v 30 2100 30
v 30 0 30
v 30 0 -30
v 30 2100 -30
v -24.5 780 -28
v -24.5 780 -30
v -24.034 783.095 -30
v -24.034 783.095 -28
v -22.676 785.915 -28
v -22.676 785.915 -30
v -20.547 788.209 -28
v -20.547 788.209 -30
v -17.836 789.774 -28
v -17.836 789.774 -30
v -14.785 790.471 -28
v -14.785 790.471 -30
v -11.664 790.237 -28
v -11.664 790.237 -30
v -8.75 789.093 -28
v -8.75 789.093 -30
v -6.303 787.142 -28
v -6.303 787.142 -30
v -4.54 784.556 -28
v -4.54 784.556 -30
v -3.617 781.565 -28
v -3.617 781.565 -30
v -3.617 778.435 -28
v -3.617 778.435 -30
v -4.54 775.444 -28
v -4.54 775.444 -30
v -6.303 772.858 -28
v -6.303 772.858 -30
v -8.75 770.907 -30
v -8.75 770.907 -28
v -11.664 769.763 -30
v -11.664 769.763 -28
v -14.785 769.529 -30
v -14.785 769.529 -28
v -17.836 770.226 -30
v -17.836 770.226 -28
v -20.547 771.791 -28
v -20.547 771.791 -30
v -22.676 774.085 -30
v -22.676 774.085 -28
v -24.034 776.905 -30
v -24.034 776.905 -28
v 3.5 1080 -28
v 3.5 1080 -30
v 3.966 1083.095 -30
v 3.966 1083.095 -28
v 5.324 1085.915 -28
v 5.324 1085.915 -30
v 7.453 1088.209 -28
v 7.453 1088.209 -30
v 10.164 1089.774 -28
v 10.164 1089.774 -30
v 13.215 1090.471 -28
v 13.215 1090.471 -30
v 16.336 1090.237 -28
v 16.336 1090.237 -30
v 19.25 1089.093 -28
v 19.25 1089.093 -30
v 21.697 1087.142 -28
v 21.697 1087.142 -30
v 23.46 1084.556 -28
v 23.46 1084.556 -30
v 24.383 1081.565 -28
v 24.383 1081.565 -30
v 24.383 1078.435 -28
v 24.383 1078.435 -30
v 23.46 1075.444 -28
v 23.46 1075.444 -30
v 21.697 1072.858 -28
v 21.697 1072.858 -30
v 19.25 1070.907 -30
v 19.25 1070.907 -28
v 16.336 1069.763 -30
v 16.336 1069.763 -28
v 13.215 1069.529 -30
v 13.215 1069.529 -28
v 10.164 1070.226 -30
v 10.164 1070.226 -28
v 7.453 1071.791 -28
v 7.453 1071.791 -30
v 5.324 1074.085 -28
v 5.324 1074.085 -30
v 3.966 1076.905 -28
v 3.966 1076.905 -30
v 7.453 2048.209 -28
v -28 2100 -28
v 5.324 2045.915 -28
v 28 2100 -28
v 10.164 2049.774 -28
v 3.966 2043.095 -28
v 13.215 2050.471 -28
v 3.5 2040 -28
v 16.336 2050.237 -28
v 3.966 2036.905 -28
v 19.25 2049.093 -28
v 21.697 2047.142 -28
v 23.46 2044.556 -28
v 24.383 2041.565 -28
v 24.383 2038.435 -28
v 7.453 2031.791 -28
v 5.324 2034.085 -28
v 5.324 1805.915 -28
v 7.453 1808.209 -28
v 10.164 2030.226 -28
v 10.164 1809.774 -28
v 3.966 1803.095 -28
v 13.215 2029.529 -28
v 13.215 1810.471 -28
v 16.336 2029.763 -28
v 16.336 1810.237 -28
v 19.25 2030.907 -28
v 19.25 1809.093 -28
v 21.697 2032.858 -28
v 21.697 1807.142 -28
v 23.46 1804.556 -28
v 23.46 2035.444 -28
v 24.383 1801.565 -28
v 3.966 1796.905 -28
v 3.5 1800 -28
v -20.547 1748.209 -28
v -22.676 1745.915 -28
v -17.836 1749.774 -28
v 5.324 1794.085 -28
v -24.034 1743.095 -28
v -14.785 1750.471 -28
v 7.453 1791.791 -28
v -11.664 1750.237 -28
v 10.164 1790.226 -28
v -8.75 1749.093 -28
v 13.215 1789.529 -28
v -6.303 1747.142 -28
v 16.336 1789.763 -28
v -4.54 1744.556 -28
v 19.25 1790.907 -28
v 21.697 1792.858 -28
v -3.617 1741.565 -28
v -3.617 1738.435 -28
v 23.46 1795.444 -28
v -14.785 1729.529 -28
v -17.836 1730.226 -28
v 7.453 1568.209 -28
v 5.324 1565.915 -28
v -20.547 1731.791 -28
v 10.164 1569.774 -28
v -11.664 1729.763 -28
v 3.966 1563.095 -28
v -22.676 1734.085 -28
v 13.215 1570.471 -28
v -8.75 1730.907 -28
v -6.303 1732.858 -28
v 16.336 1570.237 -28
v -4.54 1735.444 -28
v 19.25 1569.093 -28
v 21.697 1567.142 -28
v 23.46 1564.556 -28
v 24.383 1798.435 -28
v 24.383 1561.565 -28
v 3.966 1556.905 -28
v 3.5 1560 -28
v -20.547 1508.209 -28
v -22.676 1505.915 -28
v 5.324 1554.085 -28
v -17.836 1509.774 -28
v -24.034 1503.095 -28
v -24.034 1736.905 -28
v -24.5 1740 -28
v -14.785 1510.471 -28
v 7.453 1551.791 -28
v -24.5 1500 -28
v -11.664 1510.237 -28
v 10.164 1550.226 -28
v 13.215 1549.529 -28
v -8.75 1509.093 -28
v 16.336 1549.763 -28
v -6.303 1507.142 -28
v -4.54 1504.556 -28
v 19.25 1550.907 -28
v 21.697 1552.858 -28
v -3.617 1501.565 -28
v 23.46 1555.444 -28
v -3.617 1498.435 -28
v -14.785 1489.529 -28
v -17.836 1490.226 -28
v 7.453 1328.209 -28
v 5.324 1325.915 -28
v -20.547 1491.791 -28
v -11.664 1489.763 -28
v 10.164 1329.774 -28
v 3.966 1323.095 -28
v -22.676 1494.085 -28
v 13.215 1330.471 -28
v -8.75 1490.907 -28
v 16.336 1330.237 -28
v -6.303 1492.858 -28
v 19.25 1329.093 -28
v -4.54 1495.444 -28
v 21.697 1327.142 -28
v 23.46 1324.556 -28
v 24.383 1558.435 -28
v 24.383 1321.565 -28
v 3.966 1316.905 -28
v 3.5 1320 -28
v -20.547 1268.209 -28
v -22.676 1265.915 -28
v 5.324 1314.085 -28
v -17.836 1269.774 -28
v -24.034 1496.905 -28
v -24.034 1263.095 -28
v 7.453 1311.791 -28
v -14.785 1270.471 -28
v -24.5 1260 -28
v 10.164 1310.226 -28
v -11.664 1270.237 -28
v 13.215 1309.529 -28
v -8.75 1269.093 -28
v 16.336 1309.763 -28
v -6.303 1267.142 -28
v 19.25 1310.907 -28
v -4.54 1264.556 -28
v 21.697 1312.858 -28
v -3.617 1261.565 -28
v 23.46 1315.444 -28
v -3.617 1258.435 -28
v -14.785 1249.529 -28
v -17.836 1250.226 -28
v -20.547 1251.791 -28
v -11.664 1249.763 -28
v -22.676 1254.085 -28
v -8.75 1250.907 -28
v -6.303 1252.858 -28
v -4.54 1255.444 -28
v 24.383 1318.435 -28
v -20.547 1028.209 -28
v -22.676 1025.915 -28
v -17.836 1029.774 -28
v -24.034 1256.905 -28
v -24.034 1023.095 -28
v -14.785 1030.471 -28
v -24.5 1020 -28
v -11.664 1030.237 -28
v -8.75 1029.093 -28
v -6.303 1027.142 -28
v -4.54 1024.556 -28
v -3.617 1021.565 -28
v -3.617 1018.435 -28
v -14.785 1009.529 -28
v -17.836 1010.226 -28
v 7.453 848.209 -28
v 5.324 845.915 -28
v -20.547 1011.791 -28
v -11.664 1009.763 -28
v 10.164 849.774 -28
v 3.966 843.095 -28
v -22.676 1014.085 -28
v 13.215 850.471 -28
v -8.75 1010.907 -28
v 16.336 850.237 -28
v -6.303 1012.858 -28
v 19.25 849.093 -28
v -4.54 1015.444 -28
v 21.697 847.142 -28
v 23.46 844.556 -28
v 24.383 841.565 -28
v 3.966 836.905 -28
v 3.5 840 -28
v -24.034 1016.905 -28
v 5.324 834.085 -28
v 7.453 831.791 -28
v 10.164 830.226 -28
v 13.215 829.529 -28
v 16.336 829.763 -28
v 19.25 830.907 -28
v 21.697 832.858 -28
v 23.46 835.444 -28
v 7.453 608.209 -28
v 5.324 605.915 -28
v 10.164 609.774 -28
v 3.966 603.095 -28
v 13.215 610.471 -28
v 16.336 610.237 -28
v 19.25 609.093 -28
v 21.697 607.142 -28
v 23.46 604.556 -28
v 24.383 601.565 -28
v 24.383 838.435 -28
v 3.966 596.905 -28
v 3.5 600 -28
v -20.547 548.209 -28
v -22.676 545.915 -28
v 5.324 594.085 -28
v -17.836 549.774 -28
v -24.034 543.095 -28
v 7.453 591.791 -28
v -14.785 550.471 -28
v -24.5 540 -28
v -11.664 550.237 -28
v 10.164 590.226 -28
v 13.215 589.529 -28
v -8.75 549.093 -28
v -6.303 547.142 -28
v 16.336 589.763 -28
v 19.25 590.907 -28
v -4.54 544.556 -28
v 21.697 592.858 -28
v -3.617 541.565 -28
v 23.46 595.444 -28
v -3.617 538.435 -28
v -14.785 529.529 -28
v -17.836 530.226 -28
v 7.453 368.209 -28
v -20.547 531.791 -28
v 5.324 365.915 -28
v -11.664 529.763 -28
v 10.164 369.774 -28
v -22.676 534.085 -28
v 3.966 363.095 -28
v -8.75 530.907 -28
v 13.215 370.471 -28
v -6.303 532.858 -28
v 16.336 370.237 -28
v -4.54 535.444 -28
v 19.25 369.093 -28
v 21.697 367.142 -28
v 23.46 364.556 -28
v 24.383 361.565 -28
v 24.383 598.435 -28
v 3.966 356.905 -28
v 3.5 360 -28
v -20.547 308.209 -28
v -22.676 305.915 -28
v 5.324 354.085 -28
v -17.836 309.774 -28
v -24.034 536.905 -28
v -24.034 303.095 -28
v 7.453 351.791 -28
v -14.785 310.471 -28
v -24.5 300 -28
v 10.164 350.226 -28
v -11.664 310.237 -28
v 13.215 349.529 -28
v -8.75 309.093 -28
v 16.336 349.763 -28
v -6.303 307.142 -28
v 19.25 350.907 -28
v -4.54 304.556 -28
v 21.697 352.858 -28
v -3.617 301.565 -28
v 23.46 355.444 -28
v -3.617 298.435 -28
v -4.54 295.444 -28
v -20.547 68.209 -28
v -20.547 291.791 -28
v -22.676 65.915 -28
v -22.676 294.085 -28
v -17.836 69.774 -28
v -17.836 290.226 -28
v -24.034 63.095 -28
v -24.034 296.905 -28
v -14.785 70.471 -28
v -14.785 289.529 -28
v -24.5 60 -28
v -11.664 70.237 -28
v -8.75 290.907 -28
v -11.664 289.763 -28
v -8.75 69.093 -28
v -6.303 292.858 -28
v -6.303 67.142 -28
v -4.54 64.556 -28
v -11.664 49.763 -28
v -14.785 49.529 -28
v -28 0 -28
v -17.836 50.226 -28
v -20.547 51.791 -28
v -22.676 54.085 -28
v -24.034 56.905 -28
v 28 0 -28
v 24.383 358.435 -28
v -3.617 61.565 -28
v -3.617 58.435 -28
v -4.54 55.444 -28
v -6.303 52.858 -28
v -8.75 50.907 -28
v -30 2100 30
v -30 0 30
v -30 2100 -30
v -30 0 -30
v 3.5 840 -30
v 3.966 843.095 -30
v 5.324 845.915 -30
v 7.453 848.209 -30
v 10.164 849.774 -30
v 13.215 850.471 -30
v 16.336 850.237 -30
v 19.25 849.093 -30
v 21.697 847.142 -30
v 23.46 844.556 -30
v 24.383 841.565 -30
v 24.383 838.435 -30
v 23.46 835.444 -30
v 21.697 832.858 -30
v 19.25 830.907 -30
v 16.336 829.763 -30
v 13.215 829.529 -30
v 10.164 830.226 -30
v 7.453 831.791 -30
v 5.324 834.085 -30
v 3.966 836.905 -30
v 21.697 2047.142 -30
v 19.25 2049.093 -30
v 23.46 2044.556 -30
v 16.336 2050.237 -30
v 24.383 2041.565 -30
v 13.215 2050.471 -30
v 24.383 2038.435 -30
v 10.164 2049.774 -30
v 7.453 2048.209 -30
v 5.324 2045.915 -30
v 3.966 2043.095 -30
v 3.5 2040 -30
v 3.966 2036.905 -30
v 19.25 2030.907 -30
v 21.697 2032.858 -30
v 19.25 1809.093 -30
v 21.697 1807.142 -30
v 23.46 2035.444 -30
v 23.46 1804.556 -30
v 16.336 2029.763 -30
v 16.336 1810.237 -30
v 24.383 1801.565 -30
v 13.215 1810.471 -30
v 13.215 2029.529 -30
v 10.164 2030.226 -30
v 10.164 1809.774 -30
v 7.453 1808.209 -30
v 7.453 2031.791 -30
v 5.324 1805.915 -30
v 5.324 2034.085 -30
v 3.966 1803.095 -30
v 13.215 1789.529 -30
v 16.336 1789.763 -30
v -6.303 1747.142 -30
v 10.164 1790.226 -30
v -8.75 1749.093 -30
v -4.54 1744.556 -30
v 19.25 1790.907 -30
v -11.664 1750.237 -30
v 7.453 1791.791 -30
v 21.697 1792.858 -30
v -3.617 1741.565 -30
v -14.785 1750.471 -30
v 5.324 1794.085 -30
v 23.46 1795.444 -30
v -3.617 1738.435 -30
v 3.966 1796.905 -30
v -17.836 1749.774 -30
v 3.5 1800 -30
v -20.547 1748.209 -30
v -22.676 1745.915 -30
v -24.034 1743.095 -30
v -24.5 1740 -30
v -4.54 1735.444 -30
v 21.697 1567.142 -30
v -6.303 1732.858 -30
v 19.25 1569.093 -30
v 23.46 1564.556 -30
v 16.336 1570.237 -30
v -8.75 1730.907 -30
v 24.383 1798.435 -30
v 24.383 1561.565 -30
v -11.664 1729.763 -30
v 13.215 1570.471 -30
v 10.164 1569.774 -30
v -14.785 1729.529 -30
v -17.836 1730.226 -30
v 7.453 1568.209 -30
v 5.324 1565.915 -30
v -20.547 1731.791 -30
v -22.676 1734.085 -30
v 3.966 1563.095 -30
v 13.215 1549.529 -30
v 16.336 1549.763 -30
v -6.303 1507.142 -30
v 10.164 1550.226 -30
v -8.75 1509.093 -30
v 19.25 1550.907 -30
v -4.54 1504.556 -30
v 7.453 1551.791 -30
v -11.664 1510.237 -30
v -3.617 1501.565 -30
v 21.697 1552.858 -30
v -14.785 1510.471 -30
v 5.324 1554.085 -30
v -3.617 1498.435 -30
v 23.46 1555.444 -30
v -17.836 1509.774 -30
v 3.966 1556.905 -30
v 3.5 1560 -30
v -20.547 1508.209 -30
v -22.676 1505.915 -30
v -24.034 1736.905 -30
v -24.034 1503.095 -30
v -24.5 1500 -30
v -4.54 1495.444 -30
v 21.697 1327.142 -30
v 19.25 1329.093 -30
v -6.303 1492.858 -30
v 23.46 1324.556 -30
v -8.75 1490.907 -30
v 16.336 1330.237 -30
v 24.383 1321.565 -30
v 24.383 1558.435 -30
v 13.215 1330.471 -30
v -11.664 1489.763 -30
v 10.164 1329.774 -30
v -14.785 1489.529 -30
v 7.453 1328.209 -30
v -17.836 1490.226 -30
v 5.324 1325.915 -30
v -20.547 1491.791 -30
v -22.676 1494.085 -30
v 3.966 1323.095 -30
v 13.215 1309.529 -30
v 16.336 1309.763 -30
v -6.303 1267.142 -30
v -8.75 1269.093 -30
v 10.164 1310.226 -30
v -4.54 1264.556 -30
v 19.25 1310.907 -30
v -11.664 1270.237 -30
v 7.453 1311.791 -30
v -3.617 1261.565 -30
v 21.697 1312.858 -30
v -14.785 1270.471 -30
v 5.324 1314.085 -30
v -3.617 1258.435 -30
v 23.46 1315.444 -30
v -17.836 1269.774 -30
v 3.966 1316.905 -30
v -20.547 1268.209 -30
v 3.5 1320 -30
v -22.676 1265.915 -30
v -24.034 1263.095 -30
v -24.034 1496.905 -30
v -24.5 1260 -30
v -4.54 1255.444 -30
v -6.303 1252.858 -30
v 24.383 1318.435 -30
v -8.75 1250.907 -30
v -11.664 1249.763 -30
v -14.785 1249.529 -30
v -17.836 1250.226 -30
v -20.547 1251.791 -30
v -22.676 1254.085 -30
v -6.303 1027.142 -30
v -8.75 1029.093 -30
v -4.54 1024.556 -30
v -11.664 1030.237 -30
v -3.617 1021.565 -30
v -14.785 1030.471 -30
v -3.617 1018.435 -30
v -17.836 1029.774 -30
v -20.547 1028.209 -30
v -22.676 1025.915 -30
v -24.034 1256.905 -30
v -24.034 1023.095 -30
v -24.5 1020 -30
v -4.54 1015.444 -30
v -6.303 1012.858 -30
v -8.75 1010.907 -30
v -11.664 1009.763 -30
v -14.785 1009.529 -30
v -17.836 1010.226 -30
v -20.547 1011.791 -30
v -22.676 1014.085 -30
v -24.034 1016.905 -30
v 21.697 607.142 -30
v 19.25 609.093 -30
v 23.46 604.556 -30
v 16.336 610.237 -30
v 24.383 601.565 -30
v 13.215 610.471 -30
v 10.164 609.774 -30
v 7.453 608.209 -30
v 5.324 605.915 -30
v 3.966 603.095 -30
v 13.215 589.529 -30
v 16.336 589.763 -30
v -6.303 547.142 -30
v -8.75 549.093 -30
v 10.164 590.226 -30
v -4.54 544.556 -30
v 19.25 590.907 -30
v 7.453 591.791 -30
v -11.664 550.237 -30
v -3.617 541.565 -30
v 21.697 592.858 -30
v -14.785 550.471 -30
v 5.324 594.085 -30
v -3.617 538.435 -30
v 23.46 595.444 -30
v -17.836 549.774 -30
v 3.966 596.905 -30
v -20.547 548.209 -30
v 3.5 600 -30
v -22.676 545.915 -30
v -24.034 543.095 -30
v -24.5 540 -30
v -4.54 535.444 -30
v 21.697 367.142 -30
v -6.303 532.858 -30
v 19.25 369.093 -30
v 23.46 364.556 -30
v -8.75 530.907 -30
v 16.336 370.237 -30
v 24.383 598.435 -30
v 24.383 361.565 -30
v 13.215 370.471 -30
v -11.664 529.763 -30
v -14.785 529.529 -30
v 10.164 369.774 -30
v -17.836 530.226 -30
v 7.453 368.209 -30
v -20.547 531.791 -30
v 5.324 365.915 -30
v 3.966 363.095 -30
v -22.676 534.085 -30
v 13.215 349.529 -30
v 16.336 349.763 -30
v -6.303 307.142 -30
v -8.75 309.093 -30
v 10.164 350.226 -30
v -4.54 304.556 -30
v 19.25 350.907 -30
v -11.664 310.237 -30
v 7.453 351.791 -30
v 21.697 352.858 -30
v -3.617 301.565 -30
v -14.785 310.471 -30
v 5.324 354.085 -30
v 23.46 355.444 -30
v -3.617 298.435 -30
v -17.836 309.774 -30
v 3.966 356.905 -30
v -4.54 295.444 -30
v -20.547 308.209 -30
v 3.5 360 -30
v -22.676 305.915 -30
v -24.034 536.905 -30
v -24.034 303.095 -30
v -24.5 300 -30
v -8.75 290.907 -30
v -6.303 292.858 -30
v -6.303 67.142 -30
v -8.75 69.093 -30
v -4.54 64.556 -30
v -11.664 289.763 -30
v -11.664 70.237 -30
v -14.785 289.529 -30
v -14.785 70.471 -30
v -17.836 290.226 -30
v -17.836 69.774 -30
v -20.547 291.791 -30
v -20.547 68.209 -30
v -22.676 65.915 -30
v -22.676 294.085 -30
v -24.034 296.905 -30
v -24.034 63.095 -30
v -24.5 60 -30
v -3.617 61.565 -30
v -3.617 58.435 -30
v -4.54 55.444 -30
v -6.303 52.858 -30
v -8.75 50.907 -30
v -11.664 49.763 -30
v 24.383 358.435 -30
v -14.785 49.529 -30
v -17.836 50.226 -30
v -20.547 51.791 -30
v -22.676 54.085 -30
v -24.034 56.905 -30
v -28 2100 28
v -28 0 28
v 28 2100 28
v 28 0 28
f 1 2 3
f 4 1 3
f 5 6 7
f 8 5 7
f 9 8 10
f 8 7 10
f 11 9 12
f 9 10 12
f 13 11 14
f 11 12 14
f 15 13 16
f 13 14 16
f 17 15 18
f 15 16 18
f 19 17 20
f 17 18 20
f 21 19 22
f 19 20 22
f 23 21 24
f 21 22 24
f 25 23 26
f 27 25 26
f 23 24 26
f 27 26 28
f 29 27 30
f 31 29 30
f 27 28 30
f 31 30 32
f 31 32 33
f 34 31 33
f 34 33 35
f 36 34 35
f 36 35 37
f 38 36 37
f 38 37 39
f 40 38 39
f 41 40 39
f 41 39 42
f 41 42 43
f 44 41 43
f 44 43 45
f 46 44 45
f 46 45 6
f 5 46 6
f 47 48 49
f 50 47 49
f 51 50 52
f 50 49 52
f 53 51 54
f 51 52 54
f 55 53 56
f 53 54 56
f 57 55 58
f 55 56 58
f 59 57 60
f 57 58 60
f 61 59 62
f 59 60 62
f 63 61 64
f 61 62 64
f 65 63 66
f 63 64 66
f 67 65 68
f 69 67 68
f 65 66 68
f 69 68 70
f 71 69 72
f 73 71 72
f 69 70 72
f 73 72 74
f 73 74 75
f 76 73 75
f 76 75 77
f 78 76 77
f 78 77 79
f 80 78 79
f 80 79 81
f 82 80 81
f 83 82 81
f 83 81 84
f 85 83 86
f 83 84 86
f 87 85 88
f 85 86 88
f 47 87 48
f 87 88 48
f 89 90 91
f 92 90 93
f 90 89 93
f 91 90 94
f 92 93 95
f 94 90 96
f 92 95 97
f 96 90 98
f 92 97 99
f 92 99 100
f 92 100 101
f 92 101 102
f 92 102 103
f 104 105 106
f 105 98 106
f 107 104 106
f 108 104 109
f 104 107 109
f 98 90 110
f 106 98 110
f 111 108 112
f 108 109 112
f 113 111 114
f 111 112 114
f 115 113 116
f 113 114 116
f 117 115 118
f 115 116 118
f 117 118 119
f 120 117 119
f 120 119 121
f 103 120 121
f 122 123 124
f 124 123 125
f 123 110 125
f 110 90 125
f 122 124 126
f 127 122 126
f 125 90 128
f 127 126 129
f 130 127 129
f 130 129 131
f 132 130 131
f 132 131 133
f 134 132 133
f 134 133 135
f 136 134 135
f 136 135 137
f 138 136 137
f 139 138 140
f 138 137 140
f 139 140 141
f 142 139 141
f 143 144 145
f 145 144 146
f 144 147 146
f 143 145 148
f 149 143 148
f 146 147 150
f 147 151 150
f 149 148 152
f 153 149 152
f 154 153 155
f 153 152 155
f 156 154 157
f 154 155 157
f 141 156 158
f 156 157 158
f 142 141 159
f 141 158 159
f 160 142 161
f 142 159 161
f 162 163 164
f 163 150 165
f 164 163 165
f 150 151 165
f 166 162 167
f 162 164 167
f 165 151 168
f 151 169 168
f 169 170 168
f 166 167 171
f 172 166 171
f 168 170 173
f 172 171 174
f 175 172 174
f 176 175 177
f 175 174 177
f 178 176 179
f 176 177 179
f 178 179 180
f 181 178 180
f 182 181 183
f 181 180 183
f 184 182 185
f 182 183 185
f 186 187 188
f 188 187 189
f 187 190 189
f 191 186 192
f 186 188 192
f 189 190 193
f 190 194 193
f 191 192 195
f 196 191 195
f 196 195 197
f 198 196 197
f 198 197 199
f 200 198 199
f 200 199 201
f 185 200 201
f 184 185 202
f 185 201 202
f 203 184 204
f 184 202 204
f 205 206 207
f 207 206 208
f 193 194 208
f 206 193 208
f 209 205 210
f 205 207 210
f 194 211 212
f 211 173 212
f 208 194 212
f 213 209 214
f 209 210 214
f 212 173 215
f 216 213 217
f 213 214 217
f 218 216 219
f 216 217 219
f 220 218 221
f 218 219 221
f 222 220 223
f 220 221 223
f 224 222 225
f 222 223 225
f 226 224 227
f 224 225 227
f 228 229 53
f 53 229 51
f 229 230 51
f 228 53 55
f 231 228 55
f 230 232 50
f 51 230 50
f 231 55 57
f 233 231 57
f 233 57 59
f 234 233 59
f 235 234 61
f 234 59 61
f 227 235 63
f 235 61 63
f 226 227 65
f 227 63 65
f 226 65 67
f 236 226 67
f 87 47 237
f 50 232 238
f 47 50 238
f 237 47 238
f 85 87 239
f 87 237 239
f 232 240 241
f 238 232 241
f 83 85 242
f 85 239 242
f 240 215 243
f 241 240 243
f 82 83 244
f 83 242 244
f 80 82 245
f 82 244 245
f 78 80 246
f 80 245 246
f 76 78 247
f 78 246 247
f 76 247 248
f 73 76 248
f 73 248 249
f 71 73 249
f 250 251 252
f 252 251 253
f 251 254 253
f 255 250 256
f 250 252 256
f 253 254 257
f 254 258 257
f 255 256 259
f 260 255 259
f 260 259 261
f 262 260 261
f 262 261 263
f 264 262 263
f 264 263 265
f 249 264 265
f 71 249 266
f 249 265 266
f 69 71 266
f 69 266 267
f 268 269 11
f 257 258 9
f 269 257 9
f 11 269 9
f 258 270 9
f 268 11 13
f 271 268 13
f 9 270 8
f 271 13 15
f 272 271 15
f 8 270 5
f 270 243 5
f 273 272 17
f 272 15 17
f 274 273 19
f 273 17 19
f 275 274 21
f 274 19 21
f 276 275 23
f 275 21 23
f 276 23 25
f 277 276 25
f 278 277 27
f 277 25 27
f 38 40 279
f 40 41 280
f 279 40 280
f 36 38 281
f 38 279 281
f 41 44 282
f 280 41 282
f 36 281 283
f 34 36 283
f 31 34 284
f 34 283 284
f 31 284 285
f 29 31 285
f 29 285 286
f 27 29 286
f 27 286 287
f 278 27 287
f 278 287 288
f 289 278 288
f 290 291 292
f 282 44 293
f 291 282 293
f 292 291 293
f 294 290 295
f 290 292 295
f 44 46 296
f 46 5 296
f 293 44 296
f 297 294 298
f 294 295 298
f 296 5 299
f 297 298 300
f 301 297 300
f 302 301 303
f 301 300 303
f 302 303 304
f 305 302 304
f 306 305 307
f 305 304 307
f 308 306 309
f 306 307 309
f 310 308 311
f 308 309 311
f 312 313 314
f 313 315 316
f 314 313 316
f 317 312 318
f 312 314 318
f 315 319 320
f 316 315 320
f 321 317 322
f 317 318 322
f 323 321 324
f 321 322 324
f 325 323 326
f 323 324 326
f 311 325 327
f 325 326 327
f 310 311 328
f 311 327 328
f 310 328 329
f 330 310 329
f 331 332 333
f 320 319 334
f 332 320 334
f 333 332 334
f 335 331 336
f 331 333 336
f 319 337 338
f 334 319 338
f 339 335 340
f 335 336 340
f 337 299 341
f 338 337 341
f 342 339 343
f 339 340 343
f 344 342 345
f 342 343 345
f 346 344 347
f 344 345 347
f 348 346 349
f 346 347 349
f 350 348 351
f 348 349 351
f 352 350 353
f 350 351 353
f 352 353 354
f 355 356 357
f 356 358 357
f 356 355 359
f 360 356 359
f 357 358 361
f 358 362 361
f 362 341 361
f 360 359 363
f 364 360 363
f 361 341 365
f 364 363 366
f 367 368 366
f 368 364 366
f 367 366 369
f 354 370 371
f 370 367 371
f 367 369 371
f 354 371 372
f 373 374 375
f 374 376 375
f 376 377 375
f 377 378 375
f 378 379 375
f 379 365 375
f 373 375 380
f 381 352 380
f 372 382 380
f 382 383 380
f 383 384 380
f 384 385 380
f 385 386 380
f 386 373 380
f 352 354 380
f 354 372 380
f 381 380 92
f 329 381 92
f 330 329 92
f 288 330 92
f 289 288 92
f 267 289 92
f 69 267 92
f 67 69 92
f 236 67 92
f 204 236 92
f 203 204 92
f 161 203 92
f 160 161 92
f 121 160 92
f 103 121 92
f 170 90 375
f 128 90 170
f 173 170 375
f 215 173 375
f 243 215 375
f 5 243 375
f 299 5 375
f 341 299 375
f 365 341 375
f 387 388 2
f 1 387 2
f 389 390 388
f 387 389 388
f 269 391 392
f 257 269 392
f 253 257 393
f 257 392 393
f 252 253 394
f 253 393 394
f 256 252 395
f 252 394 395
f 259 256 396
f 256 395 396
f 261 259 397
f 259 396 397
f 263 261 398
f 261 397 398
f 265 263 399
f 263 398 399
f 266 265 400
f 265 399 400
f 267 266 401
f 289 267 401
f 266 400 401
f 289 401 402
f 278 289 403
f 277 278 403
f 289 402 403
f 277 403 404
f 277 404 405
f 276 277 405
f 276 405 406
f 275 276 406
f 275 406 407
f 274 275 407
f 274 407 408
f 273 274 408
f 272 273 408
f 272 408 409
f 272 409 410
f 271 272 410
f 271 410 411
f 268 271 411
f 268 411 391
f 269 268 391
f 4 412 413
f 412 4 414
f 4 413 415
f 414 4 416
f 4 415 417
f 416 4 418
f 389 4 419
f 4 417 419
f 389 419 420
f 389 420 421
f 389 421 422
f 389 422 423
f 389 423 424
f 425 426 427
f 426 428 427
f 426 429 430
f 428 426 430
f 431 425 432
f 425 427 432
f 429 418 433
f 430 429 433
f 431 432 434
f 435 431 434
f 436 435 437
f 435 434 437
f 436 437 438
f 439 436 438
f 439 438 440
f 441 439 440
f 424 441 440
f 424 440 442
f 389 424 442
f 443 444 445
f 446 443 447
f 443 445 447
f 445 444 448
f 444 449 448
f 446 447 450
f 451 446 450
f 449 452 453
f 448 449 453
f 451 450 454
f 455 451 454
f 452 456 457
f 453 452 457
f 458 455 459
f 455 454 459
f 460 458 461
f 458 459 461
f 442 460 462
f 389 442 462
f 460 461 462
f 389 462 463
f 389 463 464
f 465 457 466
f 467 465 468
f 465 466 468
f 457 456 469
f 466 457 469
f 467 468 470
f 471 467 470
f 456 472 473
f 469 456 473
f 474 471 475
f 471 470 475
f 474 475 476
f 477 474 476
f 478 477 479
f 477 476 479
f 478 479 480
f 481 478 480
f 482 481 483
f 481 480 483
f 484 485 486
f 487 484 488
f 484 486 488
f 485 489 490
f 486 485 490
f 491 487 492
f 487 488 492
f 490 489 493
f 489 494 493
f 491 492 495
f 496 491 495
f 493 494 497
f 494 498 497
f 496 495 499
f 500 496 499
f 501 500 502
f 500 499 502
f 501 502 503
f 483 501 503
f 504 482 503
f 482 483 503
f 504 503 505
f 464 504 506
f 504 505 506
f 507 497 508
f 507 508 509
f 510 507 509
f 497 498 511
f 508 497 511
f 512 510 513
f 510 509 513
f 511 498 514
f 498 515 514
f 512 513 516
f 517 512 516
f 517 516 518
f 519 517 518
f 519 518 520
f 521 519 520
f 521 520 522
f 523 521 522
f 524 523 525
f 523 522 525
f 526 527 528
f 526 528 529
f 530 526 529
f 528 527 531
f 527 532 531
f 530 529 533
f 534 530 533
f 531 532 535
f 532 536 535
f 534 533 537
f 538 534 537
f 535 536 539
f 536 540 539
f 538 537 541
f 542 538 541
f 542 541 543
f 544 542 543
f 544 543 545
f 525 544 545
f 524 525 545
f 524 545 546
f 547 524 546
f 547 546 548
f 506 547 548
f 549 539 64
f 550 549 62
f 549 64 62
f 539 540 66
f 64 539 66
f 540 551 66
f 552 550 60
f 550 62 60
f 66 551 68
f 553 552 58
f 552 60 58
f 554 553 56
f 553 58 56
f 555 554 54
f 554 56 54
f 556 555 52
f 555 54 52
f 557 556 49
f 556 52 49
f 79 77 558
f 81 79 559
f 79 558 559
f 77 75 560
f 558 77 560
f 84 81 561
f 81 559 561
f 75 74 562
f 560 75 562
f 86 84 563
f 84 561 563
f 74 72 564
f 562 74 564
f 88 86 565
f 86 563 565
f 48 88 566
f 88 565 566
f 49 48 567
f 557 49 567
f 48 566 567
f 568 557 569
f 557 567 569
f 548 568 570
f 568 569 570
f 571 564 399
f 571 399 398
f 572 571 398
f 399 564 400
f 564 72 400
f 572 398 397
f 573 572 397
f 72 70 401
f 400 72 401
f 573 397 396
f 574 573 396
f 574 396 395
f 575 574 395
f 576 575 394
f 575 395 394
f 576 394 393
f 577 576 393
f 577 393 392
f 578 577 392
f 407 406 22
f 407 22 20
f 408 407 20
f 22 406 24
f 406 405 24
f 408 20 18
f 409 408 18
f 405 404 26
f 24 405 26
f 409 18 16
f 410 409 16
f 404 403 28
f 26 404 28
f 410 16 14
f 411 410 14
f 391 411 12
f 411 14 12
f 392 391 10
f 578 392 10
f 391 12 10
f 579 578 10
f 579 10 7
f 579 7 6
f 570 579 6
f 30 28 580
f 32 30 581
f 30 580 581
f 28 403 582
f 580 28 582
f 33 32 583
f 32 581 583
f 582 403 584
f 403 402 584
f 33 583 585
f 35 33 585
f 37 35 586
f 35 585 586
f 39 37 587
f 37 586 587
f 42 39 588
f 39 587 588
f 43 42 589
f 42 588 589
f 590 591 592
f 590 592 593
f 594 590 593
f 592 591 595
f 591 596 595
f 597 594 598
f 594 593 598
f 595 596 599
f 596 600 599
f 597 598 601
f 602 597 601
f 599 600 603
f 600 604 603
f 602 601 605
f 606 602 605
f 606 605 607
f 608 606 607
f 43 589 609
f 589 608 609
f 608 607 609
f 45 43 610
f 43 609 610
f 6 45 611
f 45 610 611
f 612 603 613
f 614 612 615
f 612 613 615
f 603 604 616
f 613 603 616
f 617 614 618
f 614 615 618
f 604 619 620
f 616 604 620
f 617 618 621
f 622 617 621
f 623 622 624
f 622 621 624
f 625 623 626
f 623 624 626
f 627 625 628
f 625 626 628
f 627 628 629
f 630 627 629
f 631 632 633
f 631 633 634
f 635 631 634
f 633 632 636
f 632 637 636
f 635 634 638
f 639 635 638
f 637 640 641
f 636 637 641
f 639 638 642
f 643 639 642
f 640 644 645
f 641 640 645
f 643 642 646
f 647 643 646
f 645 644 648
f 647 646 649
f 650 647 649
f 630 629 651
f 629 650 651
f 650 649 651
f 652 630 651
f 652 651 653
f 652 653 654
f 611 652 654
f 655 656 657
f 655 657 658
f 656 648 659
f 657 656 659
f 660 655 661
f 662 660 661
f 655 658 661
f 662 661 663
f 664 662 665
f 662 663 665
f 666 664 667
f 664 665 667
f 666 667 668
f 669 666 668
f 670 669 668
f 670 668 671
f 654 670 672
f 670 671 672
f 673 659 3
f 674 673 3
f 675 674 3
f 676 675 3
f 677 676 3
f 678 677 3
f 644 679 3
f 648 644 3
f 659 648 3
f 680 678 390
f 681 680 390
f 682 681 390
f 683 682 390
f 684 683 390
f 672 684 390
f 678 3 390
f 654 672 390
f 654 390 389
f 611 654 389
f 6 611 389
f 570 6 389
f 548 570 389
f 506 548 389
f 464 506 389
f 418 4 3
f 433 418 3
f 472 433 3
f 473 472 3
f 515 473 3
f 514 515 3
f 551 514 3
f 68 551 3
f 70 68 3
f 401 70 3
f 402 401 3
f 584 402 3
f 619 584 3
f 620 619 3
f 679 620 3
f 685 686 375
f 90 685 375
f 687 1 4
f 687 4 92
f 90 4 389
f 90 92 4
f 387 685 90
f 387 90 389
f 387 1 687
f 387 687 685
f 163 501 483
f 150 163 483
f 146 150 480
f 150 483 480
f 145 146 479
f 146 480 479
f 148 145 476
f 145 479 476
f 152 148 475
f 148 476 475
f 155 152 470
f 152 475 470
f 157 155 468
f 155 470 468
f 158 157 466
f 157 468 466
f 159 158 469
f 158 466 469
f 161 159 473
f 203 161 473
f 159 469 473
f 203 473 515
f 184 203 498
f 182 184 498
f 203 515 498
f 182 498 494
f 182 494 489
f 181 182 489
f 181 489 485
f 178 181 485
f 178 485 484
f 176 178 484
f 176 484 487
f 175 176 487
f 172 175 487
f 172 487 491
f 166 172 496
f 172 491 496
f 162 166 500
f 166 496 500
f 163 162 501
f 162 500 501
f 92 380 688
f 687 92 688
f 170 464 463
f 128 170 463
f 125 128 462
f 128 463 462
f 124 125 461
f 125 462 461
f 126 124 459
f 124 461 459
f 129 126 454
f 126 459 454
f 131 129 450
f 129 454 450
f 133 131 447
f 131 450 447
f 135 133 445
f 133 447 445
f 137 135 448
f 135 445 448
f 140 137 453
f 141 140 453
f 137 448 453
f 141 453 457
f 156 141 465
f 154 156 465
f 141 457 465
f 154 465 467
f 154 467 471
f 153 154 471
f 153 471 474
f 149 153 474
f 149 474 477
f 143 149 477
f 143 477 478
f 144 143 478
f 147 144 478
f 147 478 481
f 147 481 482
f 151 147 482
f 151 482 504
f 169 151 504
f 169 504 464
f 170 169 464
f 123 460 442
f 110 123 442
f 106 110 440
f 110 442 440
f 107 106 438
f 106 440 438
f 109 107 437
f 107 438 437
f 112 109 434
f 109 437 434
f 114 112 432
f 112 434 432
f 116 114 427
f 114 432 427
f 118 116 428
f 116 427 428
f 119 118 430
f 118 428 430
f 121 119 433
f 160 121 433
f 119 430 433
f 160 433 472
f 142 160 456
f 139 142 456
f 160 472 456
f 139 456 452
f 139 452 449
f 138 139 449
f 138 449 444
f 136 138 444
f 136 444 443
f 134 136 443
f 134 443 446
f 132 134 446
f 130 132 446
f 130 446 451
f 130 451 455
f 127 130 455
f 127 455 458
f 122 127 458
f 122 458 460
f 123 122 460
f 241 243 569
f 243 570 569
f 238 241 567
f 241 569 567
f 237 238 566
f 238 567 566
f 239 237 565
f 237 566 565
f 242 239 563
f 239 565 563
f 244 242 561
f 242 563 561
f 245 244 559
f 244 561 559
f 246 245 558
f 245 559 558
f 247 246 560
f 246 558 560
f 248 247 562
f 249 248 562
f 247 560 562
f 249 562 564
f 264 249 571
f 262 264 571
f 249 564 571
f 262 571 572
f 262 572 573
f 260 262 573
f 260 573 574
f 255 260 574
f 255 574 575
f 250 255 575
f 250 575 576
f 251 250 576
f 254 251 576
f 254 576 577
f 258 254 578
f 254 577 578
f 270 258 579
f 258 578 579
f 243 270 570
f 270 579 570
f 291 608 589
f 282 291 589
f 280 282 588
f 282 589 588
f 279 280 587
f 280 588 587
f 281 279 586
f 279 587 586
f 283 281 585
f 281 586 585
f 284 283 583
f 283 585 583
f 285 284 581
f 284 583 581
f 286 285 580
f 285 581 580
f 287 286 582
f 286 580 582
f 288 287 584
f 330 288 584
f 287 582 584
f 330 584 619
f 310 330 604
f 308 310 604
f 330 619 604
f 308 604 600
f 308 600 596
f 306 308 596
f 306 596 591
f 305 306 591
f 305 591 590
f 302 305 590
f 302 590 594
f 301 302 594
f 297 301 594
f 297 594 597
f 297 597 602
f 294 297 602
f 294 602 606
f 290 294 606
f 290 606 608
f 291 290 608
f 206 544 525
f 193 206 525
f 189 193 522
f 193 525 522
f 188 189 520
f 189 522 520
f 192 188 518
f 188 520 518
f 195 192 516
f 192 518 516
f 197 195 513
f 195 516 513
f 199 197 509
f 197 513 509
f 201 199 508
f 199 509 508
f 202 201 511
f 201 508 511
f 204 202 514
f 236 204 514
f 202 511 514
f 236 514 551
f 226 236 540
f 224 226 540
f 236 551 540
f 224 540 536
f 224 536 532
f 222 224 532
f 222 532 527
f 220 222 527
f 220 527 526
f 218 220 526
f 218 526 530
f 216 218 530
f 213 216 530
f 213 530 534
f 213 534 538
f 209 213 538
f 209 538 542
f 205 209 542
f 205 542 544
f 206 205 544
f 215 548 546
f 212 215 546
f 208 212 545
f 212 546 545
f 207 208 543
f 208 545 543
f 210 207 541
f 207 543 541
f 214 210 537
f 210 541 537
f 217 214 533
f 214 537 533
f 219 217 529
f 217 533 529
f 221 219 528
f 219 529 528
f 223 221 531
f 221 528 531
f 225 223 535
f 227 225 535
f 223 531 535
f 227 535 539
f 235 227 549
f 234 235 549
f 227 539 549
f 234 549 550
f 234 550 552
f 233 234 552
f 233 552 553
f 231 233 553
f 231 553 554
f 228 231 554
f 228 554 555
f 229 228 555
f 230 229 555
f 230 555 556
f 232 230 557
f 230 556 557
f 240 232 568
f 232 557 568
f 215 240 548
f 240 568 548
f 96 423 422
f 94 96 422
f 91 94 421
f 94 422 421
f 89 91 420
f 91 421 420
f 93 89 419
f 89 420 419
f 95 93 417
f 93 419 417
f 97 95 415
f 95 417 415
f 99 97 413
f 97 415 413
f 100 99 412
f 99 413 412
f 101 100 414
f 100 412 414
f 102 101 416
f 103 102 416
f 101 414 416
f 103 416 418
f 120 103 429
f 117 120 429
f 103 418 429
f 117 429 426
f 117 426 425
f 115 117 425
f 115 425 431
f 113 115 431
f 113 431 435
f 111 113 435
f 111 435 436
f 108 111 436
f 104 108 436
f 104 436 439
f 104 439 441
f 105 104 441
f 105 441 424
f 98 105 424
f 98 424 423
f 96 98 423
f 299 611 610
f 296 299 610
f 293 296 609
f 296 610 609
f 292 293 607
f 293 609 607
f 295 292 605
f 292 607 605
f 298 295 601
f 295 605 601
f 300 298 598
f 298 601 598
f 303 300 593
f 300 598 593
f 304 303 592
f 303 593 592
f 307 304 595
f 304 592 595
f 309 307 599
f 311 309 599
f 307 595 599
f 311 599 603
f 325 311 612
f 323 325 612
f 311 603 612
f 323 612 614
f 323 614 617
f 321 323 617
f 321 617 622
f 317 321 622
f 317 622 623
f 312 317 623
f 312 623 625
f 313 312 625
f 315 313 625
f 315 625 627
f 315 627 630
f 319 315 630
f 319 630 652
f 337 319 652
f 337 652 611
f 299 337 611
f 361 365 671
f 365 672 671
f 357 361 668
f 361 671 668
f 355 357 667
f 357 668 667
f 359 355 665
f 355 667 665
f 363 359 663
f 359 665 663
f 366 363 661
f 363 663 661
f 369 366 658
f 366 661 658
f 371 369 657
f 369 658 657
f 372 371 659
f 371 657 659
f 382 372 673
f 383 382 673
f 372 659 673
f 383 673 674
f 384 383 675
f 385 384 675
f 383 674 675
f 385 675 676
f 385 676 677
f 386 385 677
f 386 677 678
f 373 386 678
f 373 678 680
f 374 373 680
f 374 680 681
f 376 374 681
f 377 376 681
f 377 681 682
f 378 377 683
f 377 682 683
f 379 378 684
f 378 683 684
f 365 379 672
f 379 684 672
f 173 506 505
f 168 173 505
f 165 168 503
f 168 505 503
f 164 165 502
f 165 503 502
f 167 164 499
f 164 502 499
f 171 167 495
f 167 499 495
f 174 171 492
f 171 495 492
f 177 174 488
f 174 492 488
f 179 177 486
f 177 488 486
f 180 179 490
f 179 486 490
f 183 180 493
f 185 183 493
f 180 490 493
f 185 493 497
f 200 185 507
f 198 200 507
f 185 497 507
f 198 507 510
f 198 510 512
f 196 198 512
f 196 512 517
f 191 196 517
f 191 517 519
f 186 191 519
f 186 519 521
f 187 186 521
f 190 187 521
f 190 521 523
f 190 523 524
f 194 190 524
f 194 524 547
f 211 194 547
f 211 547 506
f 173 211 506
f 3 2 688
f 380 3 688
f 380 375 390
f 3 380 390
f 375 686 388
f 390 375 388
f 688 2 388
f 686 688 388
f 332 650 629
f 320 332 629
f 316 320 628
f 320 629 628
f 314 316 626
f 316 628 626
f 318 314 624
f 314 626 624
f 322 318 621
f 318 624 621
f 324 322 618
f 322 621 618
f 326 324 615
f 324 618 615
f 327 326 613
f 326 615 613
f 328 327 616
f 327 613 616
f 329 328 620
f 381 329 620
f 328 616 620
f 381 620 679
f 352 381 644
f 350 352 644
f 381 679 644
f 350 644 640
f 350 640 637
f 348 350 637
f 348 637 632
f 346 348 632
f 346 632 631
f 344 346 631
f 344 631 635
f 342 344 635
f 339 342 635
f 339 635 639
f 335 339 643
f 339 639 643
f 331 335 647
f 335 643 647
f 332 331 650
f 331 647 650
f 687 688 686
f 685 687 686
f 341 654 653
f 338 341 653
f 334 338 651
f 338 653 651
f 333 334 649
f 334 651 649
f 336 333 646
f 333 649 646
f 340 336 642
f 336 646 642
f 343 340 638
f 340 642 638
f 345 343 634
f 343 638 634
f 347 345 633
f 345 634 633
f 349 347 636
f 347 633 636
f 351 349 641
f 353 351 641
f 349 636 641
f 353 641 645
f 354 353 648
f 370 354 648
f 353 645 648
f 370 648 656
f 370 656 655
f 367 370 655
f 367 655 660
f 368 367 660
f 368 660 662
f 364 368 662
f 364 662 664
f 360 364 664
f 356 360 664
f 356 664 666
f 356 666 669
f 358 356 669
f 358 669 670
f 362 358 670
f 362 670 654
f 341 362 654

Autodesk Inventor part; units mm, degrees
ref_plane "YZ Plane" through (0, 0, 0) normal (1, 0, 0) x (0, 1, 0)
ref_plane "XZ Plane" through (0, 0, 0) normal (0, 1, 0) x (-1, 0, 0)
ref_plane "XY Plane" through (0, 0, 0) normal (0, 0, 1) x (1, 0, 0)
sketch "Sketch2" plane through (0, 0, 0) normal (0, 1, 0) x (-1, 0, 0)
  line L0 (30, 30) -> (-30, 30)
  line L1 (-30, 30) -> (-30, -30)
  line L2 (-30, -30) -> (30, -30)
  line L3 (30, -30) -> (30, 30)
  line L4 (30, 30) -> (-30, -30) construction
  line L5 (-30, 30) -> (30, -30) construction
  line L6 (-28, -28) -> (-28, 28)
  line L7 (-28, 28) -> (28, 28)
  line L8 (28, 28) -> (28, -28)
  line L9 (28, -28) -> (-28, -28)
  point P0 (0, 0)
  point P1 (0, -190)
  point P2 (0, 0)
  dimension "d6" = 60
  dimension "d49" = 2
extrude "Extrusion2" add sketch "Sketch2" along normal blind 2100
sketch "Sketch6" plane through (30, 0, -30) normal (0, 0, -1) x (-1, 0, 0)
  line L0 (0, 0) -> (60, 0) projected
  line L1 (60, 0) -> (60, 2100) construction
  line L2 (0, 2100) -> (60, 2100)
  line L3 (0, 0) -> (0, 2100) construction
  circle A0 centre (44, 60) radius 10.5
  circle A1 centre (16, 360) radius 10.5
  point P0 (30, 0)
  dimension "d44" = 21
  dimension "d45" = 16
  dimension "d46" = 16
  dimension "d47" = 300
  dimension "d48" = 60
extrude "Extrusion6" cut sketch "Sketch6" against normal up to surface (2 mm away)
pattern_linear "Rectangular Pattern2" count 8 spacing 240 along (0, 1, 0) of "Extrusion6"
equation "\"d46\" = d45"
properties part number "DMF 082 коллектор болванка"
